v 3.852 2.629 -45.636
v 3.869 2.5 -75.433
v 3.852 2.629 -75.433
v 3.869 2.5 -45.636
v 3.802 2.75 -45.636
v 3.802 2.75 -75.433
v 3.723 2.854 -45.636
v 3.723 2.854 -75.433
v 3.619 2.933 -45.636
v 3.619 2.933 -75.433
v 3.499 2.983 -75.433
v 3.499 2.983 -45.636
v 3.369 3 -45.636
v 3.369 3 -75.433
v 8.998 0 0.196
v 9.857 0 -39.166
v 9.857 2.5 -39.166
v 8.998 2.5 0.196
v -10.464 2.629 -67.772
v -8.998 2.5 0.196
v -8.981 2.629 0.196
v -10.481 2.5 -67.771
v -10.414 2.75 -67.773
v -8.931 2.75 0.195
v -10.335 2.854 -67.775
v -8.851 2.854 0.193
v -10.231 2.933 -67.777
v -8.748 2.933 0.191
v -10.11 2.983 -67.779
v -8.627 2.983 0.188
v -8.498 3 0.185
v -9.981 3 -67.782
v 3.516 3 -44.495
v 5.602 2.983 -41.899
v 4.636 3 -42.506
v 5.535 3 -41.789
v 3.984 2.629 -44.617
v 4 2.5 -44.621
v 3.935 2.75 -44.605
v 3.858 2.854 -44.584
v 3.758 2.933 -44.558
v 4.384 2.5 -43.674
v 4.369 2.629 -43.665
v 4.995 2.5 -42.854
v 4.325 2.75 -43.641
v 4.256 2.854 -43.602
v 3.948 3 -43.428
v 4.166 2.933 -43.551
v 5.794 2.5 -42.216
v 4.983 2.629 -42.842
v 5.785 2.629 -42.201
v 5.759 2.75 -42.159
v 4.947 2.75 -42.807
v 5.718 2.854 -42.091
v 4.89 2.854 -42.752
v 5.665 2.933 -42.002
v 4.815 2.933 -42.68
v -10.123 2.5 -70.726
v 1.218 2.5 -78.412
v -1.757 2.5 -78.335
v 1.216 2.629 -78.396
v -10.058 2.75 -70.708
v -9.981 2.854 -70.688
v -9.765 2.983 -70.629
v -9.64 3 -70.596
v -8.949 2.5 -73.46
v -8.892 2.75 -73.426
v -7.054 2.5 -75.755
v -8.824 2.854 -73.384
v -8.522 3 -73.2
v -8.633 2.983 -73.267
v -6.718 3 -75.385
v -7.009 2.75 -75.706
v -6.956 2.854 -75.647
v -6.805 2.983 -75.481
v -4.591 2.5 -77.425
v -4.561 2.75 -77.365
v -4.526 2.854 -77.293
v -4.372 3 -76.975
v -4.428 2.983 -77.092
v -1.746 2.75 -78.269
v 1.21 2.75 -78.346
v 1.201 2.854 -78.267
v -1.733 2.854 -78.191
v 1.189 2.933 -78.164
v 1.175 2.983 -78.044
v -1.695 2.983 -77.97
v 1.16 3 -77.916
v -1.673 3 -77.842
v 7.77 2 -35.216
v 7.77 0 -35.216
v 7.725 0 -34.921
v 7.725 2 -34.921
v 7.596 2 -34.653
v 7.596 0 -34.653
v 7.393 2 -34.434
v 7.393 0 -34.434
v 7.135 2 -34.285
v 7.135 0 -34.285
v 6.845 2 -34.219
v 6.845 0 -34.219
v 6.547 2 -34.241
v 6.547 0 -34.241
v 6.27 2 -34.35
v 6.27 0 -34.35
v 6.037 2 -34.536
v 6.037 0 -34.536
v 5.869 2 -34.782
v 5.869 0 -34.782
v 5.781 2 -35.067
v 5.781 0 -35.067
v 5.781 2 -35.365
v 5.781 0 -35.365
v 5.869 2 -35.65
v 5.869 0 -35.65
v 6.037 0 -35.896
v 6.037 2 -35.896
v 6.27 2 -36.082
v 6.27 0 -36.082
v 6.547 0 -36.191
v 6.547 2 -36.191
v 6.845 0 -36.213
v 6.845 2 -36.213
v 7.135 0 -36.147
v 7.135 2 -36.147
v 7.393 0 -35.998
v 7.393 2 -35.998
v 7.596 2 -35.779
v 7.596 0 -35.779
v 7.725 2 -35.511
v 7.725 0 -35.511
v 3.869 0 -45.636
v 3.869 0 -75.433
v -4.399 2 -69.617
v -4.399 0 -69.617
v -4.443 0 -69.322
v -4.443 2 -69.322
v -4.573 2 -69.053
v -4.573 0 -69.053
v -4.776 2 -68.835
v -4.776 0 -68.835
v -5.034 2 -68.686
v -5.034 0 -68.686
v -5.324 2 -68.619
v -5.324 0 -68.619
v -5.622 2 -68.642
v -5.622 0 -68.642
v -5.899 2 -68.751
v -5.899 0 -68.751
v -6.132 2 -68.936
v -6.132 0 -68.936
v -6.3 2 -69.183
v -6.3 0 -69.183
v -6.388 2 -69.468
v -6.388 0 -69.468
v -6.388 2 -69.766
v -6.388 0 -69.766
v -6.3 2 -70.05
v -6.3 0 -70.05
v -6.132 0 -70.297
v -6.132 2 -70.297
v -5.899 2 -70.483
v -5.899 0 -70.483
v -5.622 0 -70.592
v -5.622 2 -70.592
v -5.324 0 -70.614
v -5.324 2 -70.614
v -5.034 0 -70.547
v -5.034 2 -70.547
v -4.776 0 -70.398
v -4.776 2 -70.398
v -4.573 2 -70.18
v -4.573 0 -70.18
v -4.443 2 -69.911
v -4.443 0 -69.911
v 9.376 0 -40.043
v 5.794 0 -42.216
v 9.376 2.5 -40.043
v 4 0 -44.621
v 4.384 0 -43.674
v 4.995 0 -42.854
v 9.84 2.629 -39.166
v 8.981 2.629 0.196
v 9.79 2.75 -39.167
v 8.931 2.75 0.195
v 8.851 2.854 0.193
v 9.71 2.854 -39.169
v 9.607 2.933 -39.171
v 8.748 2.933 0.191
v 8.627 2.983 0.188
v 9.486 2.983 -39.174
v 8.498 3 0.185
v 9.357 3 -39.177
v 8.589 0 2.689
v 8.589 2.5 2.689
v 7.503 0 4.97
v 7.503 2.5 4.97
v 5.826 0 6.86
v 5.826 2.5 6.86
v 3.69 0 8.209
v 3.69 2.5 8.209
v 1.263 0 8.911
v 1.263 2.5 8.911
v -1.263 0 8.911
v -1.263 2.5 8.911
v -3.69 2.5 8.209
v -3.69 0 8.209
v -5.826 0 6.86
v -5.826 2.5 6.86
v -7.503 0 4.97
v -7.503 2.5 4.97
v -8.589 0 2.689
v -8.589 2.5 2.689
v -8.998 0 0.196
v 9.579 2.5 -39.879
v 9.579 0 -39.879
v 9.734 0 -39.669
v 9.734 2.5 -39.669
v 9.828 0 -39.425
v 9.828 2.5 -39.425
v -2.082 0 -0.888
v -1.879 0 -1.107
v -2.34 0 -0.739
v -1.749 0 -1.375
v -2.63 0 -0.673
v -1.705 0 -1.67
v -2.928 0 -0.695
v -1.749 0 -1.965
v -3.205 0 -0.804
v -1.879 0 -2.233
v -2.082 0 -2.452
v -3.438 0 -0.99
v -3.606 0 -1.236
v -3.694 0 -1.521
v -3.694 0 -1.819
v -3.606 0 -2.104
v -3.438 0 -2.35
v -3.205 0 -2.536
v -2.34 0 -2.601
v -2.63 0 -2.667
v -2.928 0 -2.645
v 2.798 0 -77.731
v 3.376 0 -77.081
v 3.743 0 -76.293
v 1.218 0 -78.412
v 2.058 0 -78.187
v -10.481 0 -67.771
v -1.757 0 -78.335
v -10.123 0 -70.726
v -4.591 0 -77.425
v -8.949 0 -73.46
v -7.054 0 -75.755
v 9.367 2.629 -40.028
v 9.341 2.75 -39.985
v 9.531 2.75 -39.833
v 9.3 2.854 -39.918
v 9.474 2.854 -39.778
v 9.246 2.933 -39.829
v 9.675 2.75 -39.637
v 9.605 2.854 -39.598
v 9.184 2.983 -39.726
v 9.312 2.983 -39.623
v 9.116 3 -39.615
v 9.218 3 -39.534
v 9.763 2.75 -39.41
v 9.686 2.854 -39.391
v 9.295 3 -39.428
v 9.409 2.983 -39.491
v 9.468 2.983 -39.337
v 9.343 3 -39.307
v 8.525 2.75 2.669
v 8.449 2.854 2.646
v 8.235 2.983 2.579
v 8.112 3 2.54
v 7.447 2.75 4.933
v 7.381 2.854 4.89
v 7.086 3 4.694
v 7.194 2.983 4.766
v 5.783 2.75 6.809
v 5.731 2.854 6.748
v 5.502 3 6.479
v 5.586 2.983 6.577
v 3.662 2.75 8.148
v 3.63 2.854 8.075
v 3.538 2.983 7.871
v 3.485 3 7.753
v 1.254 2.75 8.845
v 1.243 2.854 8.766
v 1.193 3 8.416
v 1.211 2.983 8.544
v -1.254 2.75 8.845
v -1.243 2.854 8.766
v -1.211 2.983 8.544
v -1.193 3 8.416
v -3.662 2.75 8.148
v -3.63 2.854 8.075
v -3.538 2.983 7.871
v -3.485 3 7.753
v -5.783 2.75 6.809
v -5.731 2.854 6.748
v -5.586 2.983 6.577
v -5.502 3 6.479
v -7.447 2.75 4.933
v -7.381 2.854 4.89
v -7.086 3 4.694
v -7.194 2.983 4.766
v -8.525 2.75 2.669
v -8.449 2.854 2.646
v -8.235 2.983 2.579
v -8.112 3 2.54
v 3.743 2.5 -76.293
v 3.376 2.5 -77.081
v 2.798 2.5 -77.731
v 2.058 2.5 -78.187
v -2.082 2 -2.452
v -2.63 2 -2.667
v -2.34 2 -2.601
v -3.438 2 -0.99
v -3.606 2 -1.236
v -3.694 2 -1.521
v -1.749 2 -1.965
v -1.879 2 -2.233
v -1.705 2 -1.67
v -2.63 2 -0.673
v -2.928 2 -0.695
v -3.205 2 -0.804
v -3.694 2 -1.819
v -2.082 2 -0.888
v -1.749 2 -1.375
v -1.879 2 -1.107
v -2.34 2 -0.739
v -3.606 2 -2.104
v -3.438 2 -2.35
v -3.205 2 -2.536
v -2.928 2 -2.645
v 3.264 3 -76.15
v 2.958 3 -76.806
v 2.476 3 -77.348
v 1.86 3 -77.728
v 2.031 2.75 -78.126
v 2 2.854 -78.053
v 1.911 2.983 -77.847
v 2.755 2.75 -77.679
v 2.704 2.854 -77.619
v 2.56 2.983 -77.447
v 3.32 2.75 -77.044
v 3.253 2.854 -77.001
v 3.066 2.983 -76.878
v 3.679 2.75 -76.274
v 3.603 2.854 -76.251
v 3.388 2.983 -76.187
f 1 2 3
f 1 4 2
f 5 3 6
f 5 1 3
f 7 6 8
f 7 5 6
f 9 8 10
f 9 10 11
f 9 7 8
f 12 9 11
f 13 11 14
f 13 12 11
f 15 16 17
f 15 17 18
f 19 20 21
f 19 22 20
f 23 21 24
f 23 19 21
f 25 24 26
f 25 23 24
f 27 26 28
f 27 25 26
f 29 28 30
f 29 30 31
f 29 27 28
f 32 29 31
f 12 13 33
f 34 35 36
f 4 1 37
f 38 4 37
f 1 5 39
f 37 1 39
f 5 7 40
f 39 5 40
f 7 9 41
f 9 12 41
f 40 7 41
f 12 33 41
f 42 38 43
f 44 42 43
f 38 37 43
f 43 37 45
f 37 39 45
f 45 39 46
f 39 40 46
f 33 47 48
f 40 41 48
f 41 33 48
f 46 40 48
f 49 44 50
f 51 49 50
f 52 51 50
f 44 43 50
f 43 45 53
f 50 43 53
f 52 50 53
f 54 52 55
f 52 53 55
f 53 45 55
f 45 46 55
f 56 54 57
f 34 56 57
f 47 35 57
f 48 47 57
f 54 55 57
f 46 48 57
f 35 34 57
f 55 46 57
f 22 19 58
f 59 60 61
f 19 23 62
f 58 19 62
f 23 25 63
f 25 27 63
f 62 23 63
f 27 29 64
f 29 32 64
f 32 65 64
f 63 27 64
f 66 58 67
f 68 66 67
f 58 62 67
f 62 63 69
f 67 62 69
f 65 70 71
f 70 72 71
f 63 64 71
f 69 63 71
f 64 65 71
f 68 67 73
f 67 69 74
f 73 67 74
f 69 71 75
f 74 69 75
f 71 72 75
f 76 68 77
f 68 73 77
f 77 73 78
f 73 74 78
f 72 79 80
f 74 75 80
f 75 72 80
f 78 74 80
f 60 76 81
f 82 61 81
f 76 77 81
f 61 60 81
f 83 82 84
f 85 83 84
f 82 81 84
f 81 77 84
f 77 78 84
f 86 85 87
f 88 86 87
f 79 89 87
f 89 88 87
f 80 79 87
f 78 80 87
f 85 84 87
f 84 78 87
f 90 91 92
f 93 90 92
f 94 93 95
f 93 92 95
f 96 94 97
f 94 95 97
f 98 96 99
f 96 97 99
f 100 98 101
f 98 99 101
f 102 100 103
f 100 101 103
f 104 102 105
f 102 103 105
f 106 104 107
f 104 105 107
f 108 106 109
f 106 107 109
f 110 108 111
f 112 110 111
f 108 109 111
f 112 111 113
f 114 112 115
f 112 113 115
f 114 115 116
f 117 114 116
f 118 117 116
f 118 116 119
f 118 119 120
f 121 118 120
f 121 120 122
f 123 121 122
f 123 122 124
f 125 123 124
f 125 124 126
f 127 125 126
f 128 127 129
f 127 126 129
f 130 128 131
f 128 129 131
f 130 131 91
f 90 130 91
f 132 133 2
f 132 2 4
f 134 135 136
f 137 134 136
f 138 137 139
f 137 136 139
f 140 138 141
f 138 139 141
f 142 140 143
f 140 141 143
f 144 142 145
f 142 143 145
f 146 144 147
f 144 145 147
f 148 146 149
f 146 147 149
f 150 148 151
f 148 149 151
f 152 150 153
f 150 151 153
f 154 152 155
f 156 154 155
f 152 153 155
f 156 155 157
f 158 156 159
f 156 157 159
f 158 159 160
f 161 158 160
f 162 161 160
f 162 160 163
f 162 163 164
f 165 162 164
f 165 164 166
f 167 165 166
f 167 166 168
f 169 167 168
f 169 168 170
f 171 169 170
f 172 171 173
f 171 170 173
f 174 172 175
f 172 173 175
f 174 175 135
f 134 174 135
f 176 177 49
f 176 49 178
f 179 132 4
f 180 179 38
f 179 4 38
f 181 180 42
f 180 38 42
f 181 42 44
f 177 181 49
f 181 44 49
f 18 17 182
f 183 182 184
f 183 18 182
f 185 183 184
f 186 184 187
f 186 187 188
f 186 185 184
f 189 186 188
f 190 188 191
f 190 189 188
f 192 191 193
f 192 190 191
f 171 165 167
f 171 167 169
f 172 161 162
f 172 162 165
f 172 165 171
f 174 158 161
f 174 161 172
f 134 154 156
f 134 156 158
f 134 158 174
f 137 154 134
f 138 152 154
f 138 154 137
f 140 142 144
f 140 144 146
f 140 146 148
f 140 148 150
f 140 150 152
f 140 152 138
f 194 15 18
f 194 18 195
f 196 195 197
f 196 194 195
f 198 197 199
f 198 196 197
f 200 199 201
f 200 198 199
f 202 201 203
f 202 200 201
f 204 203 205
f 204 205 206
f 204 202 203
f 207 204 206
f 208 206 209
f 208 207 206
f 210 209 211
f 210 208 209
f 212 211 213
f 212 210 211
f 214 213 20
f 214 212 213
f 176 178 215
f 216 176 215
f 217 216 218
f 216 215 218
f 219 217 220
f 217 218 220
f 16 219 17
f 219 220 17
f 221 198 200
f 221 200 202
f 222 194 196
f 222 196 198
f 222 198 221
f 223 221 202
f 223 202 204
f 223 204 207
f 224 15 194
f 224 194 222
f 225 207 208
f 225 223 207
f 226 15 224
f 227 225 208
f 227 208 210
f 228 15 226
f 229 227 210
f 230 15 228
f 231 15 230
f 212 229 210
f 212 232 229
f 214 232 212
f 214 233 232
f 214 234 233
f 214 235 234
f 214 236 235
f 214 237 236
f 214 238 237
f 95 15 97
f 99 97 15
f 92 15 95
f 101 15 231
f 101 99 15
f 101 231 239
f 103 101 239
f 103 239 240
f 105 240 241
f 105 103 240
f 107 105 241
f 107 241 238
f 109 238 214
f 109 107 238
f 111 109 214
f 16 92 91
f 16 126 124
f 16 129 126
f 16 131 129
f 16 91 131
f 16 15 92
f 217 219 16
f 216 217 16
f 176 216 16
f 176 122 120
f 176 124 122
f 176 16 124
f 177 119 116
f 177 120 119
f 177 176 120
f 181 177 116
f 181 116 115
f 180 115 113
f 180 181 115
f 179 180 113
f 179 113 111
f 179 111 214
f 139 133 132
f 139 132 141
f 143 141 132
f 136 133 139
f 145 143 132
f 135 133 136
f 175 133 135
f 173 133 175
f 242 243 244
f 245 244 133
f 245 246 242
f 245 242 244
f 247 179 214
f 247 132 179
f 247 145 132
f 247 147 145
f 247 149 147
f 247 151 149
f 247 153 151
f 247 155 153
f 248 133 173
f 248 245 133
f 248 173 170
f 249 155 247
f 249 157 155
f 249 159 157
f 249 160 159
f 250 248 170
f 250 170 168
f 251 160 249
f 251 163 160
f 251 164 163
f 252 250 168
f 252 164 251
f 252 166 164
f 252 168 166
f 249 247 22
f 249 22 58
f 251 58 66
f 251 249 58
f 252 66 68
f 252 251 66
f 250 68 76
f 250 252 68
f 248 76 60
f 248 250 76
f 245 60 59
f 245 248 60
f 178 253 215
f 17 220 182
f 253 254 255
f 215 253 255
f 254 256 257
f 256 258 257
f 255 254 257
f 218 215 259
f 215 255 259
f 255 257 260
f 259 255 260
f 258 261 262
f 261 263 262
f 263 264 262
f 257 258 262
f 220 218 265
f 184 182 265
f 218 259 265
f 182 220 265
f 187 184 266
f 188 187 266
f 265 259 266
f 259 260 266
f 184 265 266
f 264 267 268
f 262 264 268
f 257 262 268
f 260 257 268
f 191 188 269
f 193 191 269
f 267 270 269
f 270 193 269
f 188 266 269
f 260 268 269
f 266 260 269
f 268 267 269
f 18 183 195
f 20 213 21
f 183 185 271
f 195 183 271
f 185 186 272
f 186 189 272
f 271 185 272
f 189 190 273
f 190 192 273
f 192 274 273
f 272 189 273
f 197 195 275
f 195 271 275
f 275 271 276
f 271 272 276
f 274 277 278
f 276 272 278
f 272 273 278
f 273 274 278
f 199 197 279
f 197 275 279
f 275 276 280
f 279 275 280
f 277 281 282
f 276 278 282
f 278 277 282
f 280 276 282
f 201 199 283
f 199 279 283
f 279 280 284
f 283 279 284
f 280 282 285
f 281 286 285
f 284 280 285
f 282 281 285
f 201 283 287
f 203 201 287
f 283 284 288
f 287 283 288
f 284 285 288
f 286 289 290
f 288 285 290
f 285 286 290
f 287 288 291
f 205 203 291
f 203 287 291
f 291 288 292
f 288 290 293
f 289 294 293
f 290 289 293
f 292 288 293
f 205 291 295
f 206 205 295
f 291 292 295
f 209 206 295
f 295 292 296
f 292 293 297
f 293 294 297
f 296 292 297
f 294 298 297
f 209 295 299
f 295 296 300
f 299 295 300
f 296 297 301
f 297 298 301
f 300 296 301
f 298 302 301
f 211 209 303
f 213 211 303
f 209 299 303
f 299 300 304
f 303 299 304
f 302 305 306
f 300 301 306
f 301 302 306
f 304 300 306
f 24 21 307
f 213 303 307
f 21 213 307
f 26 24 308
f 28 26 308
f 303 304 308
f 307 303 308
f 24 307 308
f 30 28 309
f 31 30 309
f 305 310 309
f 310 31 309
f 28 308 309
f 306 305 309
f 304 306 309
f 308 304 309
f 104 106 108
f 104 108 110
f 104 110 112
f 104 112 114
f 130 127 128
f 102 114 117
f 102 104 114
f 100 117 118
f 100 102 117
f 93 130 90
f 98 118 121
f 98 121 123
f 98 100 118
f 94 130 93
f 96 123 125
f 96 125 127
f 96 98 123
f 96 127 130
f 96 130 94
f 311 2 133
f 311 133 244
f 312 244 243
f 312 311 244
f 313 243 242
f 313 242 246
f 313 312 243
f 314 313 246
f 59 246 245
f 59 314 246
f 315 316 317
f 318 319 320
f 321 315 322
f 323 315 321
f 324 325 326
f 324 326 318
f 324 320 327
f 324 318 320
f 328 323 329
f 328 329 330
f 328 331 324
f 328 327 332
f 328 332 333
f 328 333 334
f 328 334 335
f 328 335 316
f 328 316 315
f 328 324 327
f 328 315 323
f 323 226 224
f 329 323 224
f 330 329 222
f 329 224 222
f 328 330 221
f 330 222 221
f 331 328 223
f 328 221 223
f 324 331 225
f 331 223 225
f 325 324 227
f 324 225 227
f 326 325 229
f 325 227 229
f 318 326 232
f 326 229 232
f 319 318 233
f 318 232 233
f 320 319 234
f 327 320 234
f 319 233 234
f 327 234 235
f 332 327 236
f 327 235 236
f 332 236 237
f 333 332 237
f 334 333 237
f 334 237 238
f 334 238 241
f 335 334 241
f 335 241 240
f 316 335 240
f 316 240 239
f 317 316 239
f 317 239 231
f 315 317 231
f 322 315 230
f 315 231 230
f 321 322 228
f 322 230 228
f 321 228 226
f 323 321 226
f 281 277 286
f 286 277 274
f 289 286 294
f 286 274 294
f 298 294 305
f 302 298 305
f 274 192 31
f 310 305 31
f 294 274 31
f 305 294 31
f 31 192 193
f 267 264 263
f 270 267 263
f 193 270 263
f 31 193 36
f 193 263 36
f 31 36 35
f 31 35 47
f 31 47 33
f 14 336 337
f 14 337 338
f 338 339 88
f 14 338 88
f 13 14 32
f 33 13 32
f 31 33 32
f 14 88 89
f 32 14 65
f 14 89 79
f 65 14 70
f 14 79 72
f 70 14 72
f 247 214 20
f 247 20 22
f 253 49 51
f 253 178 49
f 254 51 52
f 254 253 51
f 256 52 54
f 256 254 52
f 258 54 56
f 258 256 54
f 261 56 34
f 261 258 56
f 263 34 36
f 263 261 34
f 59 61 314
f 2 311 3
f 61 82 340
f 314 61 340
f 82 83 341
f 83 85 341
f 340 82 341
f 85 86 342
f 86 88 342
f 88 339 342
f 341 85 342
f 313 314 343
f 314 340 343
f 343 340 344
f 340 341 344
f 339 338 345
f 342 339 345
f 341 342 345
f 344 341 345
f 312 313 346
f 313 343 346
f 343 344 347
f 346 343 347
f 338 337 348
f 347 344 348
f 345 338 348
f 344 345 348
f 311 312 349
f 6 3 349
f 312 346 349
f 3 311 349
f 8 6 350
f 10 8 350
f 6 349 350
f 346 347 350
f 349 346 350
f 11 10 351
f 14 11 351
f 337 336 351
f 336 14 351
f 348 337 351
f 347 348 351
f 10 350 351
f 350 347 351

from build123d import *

# Parameters (mm, degrees)
BOSS_EXTRUDE1_DEPTH = 3
FILLET1_R           = 4
FILLET2_R           = 3
FILLET3_R           = 1
FILLET5_R           = 0.5
SKETCH1_R           = 1
CUT_EXTRUDE1_DEPTH  = 2


with BuildPart() as part:
    # cover_itself → Boss-Extrude1 (new body)
    with BuildSketch(Plane(origin=(0, 0, 0), x_dir=(1, 0, 0), z_dir=(0, 1, 0))):
        with BuildLine():
            Line((-8.997858244, -0.196333965), (-10.480917414, 67.771305568))
            ThreePointArc((-10.480917414, 67.771305568), (-5.982302771, 76.608947935), (3.869342172, 77.743209027))
            Line((3.869342172, 77.743209027), (3.869342172, 43.384098405))
            Line((3.869342172, 43.384098405), (9.869342172, 39.743209027))
            Line((9.869342172, 39.743209027), (8.997858244, -0.196333965))
            ThreePointArc((8.997858244, -0.196333965), (0, -9), (-8.997858244, -0.196333965))
        make_face()
    extrude(amount=BOSS_EXTRUDE1_DEPTH)

    # Fillet1
    fillet1_edges = [part.edges().sort_by_distance(p)[0] for p in [
        (3.869342172, 1.5, -43.384098405),
    ]]
    fillet(fillet1_edges, radius=FILLET1_R)

    # Fillet2
    fillet2_edges = [part.edges().sort_by_distance(p)[0] for p in [
        (3.869342172, 1.5, -77.743209027),
    ]]
    fillet(fillet2_edges, radius=FILLET2_R)

    # Fillet3
    fillet3_edges = [part.edges().sort_by_distance(p)[0] for p in [
        (9.869342172, 1.5, -39.743209027),
    ]]
    fillet(fillet3_edges, radius=FILLET3_R)

    # Fillet5
    fillet5_edges = [part.edges().sort_by_distance(p)[0] for p in [
        (-9.739387829, 3, -33.787485802),
        (3.869342172, 3, -60.534214462),
        (4.383630471, 3, -43.673589393),
        (-7.054041855, 3, -75.755154705),
        (3.110493996, 3, -77.427046765),
        (7.585003856, 3, -41.129379545),
        (9.733712071, 3, -39.668799805),
        (0, 3, 9),
        (9.427302793, 3, -19.484831093),
    ]]
    fillet(fillet5_edges, radius=FILLET5_R)

    # Sketch1 → Cut-Extrude1 (cut)
    with BuildSketch(Plane.XZ):
        with Locations((-2.705062156, -1.67)):
            Circle(SKETCH1_R)
        with Locations((6.76984482, -35.216036183)):
            Circle(SKETCH1_R)
        with Locations((-5.399070001, -69.616613762)):
            Circle(SKETCH1_R)
    extrude(amount=-CUT_EXTRUDE1_DEPTH, mode=Mode.SUBTRACT)


solid = part.part
